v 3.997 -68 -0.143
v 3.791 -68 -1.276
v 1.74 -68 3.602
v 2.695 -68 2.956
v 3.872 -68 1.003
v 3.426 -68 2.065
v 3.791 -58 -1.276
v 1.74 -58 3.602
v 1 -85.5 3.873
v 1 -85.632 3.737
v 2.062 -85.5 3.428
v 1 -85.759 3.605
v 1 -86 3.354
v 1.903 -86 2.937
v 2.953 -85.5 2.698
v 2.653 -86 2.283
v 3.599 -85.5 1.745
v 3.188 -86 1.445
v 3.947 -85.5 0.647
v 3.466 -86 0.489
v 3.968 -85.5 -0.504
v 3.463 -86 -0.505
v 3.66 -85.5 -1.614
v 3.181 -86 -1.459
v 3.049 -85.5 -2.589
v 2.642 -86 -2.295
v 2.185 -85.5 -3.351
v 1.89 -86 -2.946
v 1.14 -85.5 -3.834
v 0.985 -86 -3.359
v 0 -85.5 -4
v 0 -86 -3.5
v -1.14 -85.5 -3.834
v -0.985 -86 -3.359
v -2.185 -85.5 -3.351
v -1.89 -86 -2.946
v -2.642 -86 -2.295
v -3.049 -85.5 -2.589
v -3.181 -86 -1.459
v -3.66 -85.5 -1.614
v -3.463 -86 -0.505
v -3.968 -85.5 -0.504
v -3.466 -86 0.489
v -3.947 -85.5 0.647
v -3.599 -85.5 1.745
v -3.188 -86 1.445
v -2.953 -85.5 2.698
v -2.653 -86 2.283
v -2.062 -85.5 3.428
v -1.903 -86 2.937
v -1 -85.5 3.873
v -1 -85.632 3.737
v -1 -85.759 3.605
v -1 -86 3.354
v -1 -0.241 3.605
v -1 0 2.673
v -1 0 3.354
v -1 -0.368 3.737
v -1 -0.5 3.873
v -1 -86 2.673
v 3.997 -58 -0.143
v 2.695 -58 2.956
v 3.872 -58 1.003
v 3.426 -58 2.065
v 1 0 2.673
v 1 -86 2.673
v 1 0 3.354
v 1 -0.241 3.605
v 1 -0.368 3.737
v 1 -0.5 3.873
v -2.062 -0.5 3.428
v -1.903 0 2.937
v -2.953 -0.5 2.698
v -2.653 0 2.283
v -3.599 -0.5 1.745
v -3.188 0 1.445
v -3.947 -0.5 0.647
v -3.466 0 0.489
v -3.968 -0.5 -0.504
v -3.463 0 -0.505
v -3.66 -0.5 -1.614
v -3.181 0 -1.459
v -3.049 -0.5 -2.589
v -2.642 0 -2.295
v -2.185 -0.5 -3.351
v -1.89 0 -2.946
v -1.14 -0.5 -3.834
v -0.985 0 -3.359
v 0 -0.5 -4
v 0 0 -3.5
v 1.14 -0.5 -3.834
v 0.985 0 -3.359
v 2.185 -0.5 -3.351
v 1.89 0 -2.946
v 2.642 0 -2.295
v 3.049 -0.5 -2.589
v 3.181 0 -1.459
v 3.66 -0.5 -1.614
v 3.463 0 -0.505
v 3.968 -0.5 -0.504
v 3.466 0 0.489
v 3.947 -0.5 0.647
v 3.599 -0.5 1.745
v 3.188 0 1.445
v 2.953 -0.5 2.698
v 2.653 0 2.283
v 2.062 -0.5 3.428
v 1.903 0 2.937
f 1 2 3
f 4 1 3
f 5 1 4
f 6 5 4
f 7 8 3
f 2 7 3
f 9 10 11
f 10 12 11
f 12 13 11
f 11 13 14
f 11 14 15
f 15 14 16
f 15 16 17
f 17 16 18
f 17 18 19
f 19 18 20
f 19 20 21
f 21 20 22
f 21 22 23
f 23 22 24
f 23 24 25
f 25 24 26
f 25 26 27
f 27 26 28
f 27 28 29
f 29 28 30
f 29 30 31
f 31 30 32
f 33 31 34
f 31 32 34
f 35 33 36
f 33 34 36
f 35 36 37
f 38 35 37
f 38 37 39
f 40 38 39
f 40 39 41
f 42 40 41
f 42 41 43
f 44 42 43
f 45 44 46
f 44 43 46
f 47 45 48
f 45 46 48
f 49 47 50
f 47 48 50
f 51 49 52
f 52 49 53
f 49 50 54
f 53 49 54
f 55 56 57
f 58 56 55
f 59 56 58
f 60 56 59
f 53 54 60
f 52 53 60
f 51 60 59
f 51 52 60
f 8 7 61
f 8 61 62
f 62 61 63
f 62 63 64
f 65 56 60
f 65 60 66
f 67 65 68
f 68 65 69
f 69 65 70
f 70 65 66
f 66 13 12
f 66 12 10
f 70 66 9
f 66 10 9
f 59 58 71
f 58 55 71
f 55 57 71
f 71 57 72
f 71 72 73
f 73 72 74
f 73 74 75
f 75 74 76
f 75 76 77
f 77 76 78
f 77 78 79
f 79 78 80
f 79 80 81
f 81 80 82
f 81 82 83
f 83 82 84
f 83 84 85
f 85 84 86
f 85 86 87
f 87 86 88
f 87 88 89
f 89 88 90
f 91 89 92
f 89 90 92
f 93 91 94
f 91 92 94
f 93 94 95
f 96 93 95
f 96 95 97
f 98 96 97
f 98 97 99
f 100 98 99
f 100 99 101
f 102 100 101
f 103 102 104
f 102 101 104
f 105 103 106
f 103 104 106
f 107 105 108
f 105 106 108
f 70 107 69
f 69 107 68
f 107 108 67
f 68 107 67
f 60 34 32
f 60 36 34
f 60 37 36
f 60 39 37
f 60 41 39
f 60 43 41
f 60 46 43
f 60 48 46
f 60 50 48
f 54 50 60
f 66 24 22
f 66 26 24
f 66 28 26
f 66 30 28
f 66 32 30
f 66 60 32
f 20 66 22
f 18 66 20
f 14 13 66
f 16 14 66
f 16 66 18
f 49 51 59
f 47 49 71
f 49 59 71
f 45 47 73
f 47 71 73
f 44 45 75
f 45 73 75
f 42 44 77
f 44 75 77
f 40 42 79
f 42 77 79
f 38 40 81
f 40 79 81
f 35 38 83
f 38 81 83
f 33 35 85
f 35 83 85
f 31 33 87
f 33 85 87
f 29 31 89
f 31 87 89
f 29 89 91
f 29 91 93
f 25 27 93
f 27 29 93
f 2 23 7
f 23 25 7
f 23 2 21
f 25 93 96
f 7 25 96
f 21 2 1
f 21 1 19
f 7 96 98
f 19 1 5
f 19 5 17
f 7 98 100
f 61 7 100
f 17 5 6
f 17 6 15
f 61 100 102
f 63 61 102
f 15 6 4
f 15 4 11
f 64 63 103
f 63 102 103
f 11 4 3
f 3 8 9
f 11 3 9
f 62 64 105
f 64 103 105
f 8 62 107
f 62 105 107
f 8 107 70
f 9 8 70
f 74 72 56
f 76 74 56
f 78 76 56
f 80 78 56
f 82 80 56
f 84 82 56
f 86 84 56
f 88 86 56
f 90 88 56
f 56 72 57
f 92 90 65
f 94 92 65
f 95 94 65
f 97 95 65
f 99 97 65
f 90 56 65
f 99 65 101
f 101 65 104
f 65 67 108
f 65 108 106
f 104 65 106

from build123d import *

# Parameters (mm, degrees)
F0_R     = 4
F1_DEPTH = 86
F2_W     = 2
F2_H     = 2.6729833462
F3_DEPTH = 86.001
F4_SIZE  = 0.5
F7_W     = 10
F7_H     = 16.0862193677
F8_DEPTH = 2.1892940191


with BuildPart() as f1:
    # F0 (on Front) → F1 (new body)
    with BuildSketch(Plane.XZ):
        Circle(F0_R)
    extrude(amount=F1_DEPTH)

    # F2 (on face) → F3 (cut, through all)
    with BuildSketch(Plane.XZ.offset(86)):
        with Locations((0, 4.0094750193)):
            Rectangle(F2_W, F2_H)
    extrude(amount=-F3_DEPTH, mode=Mode.SUBTRACT)

    # F4
    f4_edges = [f1.edges().sort_by_distance(p)[0] for p in [
        (0, -86, -4),
        (0, 0, -4),
    ]]
    chamfer(f4_edges, length=F4_SIZE)

    # F7 (on face) → F8 (cut, through all)
    with BuildSketch(Plane(origin=(2.7655894548, 0, 1.1625467594), x_dir=(0, -1, 0), z_dir=(-0.9218631516, 0, -0.3875155865))):
        with Locations((63, 0.6007021293)):
            Rectangle(F7_W, F7_H)
    extrude(amount=-F8_DEPTH, mode=Mode.SUBTRACT)


solid = f1.part
